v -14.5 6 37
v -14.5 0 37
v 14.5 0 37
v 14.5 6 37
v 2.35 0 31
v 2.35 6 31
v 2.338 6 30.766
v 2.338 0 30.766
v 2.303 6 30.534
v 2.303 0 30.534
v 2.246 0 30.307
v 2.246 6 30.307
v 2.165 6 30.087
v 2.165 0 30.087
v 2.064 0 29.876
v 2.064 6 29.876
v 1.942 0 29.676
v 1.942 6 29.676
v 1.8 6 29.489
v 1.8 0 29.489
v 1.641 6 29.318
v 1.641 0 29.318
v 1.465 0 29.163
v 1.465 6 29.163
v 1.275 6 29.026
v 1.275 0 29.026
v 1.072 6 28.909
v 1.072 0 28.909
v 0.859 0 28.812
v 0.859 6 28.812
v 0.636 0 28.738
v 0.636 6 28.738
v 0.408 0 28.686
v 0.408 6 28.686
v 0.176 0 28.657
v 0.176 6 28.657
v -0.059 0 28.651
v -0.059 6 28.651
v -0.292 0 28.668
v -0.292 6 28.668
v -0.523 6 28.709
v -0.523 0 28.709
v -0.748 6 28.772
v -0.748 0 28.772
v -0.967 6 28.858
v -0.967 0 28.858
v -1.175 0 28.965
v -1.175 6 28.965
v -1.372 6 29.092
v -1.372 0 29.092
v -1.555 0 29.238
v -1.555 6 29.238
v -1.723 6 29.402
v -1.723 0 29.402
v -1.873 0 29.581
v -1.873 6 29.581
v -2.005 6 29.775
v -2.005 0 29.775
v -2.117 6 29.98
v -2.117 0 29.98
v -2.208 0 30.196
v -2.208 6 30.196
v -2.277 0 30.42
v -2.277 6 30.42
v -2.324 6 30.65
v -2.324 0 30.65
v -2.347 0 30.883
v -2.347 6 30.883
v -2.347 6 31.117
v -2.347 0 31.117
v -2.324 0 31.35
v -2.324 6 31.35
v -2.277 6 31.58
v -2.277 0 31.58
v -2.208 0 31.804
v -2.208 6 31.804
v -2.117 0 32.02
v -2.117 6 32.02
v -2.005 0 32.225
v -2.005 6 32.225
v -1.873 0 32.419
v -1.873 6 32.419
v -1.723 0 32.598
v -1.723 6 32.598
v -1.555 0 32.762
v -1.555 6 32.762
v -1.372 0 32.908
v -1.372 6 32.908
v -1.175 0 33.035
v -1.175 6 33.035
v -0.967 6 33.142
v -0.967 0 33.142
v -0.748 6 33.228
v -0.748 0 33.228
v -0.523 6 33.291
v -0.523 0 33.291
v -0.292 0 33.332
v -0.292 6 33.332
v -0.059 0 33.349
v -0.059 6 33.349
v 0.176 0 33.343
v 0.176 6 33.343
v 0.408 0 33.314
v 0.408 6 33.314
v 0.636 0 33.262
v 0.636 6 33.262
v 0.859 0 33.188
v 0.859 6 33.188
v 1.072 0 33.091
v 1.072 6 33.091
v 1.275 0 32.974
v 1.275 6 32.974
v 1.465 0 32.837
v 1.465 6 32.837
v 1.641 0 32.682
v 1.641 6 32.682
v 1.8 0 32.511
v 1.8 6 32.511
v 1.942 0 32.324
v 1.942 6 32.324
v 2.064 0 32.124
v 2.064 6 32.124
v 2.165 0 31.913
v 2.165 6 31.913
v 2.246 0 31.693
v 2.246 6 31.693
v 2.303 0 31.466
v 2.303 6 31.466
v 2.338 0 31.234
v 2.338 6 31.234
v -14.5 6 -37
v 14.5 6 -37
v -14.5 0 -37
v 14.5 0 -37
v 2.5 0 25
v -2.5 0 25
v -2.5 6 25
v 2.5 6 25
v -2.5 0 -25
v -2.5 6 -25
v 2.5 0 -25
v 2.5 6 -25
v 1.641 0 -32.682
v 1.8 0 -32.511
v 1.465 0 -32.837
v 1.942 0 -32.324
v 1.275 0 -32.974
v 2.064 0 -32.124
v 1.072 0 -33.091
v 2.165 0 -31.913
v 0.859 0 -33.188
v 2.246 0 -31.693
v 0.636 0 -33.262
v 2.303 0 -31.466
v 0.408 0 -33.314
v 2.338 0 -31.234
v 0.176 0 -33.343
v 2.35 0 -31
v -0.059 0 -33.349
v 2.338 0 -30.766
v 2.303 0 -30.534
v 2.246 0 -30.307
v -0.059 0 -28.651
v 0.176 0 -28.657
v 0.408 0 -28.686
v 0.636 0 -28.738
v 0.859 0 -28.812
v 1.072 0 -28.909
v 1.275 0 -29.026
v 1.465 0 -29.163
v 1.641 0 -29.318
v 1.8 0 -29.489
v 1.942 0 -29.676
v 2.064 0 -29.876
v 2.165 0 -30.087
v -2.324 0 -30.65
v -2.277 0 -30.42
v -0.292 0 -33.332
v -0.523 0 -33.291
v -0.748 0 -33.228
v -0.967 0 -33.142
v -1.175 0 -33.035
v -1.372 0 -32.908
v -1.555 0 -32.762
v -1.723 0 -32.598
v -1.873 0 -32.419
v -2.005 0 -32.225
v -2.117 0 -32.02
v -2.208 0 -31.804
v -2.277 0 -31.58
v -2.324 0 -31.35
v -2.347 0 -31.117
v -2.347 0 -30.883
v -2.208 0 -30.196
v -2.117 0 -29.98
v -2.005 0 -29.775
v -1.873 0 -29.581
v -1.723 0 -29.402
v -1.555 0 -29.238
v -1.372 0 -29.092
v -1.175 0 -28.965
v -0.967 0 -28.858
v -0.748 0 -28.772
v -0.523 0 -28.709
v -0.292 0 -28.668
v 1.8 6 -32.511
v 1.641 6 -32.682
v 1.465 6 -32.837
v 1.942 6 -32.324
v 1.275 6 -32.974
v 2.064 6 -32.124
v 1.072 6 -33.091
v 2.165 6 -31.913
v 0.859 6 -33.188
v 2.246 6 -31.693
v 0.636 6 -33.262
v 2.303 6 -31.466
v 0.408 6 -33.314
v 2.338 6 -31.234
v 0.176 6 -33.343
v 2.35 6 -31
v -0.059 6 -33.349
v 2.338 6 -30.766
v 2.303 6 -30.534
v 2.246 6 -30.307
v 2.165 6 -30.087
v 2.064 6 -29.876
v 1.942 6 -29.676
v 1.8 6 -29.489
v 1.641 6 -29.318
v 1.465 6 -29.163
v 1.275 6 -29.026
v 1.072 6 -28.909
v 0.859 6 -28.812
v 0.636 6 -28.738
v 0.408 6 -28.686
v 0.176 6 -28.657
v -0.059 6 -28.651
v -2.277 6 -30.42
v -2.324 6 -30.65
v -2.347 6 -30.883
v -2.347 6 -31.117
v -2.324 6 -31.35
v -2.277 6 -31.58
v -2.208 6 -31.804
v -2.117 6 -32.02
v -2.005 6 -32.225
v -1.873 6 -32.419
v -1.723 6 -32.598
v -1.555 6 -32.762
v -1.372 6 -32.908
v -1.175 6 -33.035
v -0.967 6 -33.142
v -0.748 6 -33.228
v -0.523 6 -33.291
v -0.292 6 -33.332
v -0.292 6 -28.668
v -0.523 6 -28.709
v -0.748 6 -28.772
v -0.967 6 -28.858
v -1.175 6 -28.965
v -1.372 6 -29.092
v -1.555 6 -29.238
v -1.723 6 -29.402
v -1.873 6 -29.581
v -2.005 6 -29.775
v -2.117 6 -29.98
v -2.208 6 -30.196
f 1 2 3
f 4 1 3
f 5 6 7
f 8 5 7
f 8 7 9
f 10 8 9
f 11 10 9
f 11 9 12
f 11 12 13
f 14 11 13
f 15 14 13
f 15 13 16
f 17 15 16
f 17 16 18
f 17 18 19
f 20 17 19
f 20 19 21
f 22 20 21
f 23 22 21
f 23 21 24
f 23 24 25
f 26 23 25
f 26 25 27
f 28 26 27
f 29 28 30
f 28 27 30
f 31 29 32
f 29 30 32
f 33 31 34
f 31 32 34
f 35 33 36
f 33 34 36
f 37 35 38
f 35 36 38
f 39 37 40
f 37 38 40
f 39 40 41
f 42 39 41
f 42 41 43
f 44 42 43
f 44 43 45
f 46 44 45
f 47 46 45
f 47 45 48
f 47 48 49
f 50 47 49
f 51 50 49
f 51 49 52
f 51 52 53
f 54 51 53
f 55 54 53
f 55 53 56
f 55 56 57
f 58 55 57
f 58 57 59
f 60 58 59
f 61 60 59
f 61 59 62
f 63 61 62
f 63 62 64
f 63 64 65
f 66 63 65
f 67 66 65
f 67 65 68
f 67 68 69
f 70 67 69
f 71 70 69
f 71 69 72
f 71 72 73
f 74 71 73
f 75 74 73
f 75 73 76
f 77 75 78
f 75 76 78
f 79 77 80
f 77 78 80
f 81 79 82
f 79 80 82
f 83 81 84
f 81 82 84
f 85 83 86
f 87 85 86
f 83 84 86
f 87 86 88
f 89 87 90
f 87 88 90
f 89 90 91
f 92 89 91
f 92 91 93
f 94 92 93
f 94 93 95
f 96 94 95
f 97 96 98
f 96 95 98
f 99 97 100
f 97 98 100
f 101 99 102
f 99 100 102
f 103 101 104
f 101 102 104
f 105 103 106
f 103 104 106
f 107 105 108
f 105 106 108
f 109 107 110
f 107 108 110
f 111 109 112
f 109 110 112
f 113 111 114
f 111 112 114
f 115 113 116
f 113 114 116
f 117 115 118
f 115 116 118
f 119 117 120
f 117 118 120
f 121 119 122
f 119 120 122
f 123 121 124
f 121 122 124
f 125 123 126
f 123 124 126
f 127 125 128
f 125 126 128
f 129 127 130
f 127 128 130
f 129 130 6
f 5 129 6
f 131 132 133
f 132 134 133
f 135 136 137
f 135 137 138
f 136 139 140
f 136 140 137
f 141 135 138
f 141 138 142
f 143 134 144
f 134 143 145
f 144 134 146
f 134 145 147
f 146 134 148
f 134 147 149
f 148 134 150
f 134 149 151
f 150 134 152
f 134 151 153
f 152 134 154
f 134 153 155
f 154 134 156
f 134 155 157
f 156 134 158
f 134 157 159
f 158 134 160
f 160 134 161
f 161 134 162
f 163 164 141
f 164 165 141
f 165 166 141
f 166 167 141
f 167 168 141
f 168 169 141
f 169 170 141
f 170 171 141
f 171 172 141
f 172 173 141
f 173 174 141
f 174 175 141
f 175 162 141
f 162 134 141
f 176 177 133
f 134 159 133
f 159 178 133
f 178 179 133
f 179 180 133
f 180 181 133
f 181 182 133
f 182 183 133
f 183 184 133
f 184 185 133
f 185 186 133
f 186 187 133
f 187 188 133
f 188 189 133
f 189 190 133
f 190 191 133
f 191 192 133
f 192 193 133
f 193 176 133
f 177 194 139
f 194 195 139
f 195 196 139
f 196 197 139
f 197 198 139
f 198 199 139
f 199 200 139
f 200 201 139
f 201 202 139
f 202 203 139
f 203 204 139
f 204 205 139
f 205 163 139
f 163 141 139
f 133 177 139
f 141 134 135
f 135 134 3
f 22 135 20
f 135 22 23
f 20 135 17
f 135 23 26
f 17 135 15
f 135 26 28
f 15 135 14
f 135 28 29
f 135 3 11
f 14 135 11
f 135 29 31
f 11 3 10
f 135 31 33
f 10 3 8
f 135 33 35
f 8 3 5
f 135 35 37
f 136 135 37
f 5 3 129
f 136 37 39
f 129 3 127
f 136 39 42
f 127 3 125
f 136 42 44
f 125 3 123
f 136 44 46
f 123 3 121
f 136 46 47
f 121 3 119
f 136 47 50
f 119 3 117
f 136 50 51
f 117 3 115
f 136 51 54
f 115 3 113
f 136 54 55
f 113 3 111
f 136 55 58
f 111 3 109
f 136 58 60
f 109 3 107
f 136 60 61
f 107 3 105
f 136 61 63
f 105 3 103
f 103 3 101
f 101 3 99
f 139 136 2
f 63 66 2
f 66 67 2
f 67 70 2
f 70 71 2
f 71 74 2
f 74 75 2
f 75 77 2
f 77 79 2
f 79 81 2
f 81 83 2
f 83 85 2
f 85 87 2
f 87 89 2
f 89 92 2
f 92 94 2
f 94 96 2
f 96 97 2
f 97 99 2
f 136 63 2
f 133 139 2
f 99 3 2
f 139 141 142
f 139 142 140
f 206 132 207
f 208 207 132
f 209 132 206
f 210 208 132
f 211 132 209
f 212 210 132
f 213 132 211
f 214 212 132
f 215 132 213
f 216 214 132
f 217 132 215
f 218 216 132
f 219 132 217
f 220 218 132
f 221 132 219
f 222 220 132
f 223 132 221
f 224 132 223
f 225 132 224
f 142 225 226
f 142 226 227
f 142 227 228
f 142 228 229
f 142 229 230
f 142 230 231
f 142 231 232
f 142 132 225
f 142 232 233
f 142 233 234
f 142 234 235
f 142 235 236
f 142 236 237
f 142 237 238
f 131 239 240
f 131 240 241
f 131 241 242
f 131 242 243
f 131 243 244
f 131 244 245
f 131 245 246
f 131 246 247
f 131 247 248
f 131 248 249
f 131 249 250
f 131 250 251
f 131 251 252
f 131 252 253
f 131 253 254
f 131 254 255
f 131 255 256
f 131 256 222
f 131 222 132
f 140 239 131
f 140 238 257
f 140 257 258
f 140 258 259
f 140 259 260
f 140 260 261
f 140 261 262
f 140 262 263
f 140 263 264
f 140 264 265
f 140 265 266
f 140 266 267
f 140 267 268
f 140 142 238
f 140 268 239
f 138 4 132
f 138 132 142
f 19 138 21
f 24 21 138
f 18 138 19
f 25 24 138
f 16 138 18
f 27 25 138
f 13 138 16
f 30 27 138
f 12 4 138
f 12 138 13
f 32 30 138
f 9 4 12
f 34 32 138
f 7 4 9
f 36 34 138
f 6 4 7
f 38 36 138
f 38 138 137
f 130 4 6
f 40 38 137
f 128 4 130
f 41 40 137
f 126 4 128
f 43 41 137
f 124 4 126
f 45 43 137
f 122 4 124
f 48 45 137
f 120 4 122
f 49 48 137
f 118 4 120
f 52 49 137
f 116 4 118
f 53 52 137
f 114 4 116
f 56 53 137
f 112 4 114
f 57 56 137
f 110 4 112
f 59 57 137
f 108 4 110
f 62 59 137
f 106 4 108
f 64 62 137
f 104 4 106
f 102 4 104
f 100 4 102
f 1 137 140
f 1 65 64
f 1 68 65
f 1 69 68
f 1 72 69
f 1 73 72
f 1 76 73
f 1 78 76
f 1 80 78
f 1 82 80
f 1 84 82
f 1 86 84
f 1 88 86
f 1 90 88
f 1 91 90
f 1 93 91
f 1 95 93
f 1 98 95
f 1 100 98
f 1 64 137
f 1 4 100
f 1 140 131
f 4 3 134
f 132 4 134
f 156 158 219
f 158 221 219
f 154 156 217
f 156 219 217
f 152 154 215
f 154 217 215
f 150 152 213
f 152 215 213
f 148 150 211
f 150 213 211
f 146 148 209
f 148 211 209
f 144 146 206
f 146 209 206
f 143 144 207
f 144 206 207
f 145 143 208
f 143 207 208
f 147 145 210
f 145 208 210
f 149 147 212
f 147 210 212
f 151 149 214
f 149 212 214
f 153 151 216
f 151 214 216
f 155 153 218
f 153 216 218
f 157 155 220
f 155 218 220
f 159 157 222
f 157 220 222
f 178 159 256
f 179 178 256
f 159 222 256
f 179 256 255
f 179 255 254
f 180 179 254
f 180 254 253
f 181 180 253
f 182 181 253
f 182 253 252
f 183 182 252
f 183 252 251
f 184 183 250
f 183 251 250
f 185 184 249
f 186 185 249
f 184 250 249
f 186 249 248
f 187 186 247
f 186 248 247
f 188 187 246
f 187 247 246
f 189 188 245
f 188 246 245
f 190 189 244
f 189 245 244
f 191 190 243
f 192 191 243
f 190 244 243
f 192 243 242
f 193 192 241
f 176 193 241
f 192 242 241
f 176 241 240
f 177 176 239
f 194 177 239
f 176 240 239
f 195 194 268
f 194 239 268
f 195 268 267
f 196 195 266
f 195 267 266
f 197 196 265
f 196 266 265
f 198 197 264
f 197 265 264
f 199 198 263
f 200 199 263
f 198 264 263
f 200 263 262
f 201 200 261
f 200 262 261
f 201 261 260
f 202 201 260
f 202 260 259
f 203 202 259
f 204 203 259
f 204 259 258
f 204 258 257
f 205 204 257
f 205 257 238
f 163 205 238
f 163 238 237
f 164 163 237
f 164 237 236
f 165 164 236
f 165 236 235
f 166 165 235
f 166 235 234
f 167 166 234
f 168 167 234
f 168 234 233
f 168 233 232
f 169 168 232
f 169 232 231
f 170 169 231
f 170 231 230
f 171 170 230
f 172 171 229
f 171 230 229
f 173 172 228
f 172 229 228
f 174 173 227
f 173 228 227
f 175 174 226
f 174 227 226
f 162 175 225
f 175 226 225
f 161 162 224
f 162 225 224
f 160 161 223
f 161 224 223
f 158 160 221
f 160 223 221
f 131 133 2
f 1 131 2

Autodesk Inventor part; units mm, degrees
ref_plane "YZ Plane" through (0, 0, 0) normal (1, 0, 0) x (0, 1, 0)
ref_plane "XZ Plane" through (0, 0, 0) normal (0, 1, 0) x (-1, 0, 0)
ref_plane "XY Plane" through (0, 0, 0) normal (0, 0, 1) x (1, 0, 0)
sketch "Boceto1" plane through (0, 0, 0) normal (0, 1, 0) x (-1, 0, 0)
  line L0 (-14.5, -37) -> (14.5, -37)
  line L1 (14.5, -37) -> (14.5, 37)
  line L2 (14.5, 37) -> (-14.5, 37)
  line L3 (-14.5, 37) -> (-14.5, -37)
  line L4 (-14.5, -37) -> (14.5, 37) construction
  line L5 (14.5, -37) -> (-14.5, 37) construction
  line L6 (-2.5, -25) -> (2.5, -25)
  line L7 (2.5, -25) -> (2.5, 25)
  line L8 (2.5, 25) -> (-2.5, 25)
  line L9 (-2.5, 25) -> (-2.5, -25)
  line L10 (-2.5, -25) -> (2.5, 25) construction
  line L11 (2.5, -25) -> (-2.5, 25) construction
  point P0 (0, 0)
  dimension "d2" = 5
  dimension "d3" = 50
  dimension "d4" = 12
  dimension "d5" = 12
extrude "Extrusión1" add sketch "Boceto1" along normal blind 6
sketch "Boceto2" plane through (0, 6, 0) normal (0, 1, 0) x (1, 0, 0)
  circle A0 centre (0, -31) radius 2.35
  line L0 (-14.5, -37) -> (14.5, -37) projected
  point P0 (0, 0)
  dimension "d8" = 4.7
  dimension "d9" = 6
extrude "Extrusión2" cut sketch "Boceto2" against normal through all
mirror "Simetría1" about plane through (0, 0, 0) normal (0, 0, 1) of "Extrusión2"
properties part number "sotenedor"
